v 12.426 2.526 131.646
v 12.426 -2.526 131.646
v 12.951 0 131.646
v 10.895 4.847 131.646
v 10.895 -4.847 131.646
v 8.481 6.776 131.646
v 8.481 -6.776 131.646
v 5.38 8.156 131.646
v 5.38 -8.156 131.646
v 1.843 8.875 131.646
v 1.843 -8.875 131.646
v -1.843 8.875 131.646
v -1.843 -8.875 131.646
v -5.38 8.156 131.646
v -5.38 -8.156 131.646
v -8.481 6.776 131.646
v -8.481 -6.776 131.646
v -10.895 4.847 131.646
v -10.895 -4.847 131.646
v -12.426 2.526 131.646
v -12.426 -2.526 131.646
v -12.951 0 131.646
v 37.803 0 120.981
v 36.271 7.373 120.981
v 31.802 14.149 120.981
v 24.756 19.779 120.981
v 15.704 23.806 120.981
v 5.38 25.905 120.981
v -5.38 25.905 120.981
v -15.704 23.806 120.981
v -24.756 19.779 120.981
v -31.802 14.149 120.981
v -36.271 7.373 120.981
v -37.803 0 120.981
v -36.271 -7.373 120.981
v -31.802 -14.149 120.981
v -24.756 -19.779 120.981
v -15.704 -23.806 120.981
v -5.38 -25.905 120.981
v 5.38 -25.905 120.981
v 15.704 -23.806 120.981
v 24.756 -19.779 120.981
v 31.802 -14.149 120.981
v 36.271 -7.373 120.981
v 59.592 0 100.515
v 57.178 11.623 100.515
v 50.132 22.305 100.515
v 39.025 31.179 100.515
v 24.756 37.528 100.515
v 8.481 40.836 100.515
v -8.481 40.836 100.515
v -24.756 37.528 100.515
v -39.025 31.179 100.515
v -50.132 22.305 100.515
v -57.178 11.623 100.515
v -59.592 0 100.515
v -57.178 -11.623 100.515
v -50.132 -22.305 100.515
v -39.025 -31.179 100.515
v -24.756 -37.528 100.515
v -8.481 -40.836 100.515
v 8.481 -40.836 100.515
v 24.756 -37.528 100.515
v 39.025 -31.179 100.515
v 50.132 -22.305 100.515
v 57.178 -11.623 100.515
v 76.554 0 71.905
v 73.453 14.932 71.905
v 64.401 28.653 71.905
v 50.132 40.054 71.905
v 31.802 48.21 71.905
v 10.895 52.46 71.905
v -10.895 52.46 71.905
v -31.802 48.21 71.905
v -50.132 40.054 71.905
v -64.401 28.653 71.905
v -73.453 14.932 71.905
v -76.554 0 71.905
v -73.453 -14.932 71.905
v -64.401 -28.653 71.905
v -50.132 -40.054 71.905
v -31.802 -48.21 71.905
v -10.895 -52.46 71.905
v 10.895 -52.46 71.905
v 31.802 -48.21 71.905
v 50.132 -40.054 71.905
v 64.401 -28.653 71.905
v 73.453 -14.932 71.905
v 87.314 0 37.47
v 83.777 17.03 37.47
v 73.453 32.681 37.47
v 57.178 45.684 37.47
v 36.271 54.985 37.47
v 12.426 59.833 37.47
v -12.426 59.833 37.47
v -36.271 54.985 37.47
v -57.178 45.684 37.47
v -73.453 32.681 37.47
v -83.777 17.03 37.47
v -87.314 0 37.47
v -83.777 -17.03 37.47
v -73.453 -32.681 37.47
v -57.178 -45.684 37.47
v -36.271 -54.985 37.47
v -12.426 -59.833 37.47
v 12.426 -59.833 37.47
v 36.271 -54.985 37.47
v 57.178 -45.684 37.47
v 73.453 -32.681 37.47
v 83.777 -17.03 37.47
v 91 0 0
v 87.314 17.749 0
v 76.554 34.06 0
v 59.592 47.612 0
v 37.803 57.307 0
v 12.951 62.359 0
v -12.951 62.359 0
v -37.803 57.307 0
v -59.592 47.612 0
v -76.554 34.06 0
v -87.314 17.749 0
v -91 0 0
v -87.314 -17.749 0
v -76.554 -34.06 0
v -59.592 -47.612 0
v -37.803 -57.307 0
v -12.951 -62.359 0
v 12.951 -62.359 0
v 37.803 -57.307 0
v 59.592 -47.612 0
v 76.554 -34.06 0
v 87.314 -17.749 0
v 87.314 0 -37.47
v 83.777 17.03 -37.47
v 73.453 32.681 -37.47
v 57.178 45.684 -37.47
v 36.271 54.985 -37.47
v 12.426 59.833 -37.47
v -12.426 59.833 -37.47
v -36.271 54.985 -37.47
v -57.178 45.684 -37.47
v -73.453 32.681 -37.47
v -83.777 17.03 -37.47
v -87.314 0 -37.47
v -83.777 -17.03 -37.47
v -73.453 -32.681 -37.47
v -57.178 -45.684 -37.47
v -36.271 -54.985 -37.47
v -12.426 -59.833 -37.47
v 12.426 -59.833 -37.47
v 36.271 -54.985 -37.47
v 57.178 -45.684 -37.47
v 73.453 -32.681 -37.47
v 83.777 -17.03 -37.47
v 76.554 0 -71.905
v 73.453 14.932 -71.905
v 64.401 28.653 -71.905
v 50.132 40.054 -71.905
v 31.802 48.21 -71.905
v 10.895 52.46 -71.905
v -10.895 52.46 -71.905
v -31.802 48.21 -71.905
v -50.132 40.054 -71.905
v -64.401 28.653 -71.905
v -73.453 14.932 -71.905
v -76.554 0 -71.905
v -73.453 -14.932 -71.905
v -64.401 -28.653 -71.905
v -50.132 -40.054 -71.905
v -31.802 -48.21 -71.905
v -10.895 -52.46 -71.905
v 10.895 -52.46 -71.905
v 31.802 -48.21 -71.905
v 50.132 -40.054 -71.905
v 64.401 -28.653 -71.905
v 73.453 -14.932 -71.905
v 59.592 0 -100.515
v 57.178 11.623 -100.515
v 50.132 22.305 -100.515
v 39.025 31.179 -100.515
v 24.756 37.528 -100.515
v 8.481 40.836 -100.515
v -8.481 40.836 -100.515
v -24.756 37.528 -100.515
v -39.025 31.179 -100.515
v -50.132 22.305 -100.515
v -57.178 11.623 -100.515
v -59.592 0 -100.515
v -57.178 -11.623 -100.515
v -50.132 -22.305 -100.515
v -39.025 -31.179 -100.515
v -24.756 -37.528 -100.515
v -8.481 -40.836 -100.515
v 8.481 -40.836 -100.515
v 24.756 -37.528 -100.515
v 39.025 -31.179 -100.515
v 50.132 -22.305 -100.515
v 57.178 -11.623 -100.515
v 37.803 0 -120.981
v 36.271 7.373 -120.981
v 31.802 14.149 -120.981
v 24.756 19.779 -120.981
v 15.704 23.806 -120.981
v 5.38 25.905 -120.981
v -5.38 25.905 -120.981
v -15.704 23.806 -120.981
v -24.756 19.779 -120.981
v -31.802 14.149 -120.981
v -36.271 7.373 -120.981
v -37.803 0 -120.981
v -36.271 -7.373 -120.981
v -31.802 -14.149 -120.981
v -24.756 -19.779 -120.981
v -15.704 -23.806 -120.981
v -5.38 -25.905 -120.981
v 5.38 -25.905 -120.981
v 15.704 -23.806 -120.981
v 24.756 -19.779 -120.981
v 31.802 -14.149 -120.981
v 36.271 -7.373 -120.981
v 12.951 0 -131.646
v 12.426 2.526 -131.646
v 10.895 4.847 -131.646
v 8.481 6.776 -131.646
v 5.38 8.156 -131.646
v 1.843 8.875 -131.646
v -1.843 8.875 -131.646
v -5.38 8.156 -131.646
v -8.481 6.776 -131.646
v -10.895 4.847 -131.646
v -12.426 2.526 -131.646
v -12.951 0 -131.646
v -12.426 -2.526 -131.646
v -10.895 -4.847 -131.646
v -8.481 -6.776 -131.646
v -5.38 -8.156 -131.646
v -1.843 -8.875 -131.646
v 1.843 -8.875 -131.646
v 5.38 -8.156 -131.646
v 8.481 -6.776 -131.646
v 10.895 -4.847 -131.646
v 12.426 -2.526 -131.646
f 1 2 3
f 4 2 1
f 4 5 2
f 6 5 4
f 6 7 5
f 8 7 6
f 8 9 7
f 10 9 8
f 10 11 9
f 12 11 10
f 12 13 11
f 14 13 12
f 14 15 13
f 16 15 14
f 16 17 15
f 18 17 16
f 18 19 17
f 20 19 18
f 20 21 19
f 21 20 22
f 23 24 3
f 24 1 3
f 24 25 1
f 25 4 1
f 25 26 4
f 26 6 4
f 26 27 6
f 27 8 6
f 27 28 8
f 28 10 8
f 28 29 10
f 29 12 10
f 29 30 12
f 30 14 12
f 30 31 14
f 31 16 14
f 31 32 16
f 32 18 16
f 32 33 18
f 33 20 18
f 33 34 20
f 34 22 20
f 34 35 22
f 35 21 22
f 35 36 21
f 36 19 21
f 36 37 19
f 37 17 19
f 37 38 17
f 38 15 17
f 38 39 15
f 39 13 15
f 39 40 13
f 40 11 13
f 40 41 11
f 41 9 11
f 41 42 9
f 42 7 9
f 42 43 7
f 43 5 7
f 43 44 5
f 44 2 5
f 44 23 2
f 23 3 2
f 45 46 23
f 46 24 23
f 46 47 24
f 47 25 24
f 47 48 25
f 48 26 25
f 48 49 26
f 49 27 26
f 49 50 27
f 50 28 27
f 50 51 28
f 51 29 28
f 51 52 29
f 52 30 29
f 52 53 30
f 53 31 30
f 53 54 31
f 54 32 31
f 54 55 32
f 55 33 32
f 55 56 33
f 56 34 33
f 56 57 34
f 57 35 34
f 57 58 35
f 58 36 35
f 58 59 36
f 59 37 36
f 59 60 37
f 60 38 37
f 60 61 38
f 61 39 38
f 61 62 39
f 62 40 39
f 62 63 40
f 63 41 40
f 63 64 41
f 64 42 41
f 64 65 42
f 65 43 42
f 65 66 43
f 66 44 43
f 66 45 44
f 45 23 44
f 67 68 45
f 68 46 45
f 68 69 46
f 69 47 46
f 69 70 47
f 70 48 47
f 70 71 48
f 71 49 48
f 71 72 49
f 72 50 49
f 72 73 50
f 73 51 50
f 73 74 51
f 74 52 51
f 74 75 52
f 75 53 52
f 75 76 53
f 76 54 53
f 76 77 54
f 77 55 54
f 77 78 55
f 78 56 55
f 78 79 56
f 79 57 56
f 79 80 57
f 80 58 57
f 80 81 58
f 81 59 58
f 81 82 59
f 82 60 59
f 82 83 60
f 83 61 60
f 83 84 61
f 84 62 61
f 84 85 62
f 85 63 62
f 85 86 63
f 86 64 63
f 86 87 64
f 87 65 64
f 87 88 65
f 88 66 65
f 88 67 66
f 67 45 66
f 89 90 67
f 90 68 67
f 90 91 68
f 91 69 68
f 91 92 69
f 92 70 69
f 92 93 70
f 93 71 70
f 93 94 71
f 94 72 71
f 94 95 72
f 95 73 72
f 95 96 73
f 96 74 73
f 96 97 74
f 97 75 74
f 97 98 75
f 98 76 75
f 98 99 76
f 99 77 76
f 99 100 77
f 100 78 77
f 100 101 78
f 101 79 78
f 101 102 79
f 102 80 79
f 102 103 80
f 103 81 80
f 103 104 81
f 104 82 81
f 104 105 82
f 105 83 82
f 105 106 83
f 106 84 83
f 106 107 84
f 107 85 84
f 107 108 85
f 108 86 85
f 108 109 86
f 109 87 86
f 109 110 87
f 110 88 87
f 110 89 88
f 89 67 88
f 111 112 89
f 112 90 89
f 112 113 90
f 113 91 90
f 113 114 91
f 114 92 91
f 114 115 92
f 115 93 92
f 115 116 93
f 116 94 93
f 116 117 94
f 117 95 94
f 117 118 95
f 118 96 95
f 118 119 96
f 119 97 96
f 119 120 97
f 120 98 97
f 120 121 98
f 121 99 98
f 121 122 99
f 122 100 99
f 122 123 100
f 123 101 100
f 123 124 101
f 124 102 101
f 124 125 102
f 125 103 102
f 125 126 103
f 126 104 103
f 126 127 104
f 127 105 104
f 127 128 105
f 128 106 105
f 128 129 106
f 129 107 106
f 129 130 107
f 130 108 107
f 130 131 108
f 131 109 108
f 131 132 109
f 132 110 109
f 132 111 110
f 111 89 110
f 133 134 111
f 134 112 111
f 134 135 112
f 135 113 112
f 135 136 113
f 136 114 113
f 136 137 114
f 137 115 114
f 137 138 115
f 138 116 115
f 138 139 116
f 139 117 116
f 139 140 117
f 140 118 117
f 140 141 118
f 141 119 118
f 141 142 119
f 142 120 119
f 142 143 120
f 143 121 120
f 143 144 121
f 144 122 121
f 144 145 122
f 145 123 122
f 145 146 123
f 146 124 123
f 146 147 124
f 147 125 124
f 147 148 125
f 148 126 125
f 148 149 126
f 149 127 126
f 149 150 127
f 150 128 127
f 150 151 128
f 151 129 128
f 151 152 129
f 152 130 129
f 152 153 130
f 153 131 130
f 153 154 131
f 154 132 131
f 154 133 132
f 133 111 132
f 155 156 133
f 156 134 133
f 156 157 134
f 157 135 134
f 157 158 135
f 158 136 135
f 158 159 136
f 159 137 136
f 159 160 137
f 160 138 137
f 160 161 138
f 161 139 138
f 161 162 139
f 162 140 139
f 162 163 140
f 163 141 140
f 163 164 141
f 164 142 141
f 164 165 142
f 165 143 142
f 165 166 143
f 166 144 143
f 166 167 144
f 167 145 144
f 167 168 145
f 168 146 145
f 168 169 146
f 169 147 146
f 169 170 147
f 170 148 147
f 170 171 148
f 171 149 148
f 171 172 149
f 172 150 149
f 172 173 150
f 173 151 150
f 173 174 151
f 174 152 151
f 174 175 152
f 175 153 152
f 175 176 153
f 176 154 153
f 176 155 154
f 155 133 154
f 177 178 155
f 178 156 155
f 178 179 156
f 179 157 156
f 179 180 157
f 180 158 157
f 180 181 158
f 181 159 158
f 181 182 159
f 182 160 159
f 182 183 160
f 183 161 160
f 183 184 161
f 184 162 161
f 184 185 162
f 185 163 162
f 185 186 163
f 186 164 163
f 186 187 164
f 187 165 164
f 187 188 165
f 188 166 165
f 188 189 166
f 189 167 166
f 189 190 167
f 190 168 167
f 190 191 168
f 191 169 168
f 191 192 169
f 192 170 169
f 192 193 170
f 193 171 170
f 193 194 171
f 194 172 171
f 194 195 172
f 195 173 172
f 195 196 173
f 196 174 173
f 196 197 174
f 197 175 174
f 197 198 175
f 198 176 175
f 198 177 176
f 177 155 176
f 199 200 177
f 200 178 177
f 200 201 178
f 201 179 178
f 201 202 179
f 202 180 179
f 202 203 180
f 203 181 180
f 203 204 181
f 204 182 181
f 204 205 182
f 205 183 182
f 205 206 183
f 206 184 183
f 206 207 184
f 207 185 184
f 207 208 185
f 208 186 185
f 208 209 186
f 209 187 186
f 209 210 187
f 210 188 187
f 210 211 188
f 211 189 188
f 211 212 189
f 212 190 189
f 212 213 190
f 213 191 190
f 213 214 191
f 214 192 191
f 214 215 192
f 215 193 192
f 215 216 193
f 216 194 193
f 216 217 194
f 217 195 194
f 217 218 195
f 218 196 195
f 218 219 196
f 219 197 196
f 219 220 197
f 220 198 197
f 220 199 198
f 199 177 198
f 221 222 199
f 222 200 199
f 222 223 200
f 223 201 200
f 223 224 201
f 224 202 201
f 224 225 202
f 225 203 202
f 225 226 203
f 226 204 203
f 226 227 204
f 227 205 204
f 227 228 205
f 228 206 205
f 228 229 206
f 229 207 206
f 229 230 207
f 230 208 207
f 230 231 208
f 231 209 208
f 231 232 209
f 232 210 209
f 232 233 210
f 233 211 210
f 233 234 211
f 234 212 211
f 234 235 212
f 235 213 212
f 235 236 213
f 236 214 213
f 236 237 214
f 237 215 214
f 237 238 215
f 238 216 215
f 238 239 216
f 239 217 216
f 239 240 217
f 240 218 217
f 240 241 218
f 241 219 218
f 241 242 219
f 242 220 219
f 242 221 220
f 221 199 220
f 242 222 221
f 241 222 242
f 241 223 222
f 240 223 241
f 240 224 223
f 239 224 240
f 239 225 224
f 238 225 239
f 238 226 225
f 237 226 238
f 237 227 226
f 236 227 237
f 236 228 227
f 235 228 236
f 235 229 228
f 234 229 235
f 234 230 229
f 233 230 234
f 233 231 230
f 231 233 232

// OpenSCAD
// Generated by SolidPython 1.0.1 on 2020-07-29 00:46:50


scale(v = [13, 9, 19]) {
	sphere(r = 7);
}
/***********************************************
*********      SolidPython code:      **********
************************************************
 
# import packages: SolidPython
from solid import *
from solid.utils import *
from itertools import chain, combinations, permutations


class Resize:

    def __init__(self, scad_file):
        self.scad_file = scad_file
        #self.scad_file = import_scad(scad_file)
        # cone/cylinder param:
        self.r1 = 0
        self.r2 = 0
        self.h = 0
        # rectangular prism param:
        self.w = 0
        self.l = 0
        # ellipse param:
        self.r = 0

    # import OpenScad code (file name corresponds to shape)


    # classify shape + parameters
    def assign(self, param1, param2, param3):
        if self.scad_file == 'cone.scad':
            self.r1 = param1
            self.r2 = param2
            self.h = param3
        elif self.scad_file == 'cylinder.scad':
            self.r1 = param1
            self.r2 = param2
            self.h = param3
        elif self.scad_file == 'rectangularPrism.scad':
            self.h = param1
            self.l = param2
            self.w = param3
        else:
            self.r = param1
            self.h = param2

    # resize parameters
    def iterate(self):
        x = range(3, 20, 2)
        i = 1
        if self.scad_file == 'cone.scad':
            tempList = list(permutations(x, 2))
            for temp in tempList:
                param1 = temp[0]
                param2 = temp[1]
                filepath = 'produced_scad_files/' + 'cone' + str(param1) + '_' + str(param2) + '_' + '.scad'
                scad_render_to_file(cylinder(h=param1, r1=param2, r2=0), filepath)

        elif self.scad_file == 'cylinder.scad':
            tempList = list(permutations(x, 3))
            for temp in tempList:
                param1 = temp[0]
                param2 = temp[1]
                filepath = 'produced_scad_files/' + 'cylinder' + str(param1) + '_' + str(param2) + '_' + '.scad'
                scad_render_to_file(cylinder(h=param1, r1=param2, r2=param2), filepath)

        elif self.scad_file == 'rectangularPrism.scad':
            tempList = list(permutations(x, 3))
            for temp in tempList:
                param1 = temp[0]
                param2 = temp[1]
                param3 = temp[2]
                filepath = 'produced_scad_files/' + 'rectangularPrism' + str(param1) + '_' + str(param2) + '_' + str(
                    param3) + '.scad'
                scad_render_to_file(cube(size=(param1, param2, param3)), filepath)

        elif self.scad_file == 'ellipse.scad':
            tempList = list(permutations(x, 4))
            for temp in tempList:
                param1 = temp[0]
                param2 = temp[1]
                param3 = temp[2]
                param4 = temp[3]
                filepath = 'produced_scad_files/' + 'ellipse' + str(param1) + '_' + str(param2) + '_' + str(param3) + '_' + str(param4) + '.scad'
                scad_render_to_file(scale([param1, param2, param3])(sphere(r=param4)), filepath)

    def render_to_scadfile(self):
        scad_render_to_file(scad, 'example.scad') 
 
************************************************/
